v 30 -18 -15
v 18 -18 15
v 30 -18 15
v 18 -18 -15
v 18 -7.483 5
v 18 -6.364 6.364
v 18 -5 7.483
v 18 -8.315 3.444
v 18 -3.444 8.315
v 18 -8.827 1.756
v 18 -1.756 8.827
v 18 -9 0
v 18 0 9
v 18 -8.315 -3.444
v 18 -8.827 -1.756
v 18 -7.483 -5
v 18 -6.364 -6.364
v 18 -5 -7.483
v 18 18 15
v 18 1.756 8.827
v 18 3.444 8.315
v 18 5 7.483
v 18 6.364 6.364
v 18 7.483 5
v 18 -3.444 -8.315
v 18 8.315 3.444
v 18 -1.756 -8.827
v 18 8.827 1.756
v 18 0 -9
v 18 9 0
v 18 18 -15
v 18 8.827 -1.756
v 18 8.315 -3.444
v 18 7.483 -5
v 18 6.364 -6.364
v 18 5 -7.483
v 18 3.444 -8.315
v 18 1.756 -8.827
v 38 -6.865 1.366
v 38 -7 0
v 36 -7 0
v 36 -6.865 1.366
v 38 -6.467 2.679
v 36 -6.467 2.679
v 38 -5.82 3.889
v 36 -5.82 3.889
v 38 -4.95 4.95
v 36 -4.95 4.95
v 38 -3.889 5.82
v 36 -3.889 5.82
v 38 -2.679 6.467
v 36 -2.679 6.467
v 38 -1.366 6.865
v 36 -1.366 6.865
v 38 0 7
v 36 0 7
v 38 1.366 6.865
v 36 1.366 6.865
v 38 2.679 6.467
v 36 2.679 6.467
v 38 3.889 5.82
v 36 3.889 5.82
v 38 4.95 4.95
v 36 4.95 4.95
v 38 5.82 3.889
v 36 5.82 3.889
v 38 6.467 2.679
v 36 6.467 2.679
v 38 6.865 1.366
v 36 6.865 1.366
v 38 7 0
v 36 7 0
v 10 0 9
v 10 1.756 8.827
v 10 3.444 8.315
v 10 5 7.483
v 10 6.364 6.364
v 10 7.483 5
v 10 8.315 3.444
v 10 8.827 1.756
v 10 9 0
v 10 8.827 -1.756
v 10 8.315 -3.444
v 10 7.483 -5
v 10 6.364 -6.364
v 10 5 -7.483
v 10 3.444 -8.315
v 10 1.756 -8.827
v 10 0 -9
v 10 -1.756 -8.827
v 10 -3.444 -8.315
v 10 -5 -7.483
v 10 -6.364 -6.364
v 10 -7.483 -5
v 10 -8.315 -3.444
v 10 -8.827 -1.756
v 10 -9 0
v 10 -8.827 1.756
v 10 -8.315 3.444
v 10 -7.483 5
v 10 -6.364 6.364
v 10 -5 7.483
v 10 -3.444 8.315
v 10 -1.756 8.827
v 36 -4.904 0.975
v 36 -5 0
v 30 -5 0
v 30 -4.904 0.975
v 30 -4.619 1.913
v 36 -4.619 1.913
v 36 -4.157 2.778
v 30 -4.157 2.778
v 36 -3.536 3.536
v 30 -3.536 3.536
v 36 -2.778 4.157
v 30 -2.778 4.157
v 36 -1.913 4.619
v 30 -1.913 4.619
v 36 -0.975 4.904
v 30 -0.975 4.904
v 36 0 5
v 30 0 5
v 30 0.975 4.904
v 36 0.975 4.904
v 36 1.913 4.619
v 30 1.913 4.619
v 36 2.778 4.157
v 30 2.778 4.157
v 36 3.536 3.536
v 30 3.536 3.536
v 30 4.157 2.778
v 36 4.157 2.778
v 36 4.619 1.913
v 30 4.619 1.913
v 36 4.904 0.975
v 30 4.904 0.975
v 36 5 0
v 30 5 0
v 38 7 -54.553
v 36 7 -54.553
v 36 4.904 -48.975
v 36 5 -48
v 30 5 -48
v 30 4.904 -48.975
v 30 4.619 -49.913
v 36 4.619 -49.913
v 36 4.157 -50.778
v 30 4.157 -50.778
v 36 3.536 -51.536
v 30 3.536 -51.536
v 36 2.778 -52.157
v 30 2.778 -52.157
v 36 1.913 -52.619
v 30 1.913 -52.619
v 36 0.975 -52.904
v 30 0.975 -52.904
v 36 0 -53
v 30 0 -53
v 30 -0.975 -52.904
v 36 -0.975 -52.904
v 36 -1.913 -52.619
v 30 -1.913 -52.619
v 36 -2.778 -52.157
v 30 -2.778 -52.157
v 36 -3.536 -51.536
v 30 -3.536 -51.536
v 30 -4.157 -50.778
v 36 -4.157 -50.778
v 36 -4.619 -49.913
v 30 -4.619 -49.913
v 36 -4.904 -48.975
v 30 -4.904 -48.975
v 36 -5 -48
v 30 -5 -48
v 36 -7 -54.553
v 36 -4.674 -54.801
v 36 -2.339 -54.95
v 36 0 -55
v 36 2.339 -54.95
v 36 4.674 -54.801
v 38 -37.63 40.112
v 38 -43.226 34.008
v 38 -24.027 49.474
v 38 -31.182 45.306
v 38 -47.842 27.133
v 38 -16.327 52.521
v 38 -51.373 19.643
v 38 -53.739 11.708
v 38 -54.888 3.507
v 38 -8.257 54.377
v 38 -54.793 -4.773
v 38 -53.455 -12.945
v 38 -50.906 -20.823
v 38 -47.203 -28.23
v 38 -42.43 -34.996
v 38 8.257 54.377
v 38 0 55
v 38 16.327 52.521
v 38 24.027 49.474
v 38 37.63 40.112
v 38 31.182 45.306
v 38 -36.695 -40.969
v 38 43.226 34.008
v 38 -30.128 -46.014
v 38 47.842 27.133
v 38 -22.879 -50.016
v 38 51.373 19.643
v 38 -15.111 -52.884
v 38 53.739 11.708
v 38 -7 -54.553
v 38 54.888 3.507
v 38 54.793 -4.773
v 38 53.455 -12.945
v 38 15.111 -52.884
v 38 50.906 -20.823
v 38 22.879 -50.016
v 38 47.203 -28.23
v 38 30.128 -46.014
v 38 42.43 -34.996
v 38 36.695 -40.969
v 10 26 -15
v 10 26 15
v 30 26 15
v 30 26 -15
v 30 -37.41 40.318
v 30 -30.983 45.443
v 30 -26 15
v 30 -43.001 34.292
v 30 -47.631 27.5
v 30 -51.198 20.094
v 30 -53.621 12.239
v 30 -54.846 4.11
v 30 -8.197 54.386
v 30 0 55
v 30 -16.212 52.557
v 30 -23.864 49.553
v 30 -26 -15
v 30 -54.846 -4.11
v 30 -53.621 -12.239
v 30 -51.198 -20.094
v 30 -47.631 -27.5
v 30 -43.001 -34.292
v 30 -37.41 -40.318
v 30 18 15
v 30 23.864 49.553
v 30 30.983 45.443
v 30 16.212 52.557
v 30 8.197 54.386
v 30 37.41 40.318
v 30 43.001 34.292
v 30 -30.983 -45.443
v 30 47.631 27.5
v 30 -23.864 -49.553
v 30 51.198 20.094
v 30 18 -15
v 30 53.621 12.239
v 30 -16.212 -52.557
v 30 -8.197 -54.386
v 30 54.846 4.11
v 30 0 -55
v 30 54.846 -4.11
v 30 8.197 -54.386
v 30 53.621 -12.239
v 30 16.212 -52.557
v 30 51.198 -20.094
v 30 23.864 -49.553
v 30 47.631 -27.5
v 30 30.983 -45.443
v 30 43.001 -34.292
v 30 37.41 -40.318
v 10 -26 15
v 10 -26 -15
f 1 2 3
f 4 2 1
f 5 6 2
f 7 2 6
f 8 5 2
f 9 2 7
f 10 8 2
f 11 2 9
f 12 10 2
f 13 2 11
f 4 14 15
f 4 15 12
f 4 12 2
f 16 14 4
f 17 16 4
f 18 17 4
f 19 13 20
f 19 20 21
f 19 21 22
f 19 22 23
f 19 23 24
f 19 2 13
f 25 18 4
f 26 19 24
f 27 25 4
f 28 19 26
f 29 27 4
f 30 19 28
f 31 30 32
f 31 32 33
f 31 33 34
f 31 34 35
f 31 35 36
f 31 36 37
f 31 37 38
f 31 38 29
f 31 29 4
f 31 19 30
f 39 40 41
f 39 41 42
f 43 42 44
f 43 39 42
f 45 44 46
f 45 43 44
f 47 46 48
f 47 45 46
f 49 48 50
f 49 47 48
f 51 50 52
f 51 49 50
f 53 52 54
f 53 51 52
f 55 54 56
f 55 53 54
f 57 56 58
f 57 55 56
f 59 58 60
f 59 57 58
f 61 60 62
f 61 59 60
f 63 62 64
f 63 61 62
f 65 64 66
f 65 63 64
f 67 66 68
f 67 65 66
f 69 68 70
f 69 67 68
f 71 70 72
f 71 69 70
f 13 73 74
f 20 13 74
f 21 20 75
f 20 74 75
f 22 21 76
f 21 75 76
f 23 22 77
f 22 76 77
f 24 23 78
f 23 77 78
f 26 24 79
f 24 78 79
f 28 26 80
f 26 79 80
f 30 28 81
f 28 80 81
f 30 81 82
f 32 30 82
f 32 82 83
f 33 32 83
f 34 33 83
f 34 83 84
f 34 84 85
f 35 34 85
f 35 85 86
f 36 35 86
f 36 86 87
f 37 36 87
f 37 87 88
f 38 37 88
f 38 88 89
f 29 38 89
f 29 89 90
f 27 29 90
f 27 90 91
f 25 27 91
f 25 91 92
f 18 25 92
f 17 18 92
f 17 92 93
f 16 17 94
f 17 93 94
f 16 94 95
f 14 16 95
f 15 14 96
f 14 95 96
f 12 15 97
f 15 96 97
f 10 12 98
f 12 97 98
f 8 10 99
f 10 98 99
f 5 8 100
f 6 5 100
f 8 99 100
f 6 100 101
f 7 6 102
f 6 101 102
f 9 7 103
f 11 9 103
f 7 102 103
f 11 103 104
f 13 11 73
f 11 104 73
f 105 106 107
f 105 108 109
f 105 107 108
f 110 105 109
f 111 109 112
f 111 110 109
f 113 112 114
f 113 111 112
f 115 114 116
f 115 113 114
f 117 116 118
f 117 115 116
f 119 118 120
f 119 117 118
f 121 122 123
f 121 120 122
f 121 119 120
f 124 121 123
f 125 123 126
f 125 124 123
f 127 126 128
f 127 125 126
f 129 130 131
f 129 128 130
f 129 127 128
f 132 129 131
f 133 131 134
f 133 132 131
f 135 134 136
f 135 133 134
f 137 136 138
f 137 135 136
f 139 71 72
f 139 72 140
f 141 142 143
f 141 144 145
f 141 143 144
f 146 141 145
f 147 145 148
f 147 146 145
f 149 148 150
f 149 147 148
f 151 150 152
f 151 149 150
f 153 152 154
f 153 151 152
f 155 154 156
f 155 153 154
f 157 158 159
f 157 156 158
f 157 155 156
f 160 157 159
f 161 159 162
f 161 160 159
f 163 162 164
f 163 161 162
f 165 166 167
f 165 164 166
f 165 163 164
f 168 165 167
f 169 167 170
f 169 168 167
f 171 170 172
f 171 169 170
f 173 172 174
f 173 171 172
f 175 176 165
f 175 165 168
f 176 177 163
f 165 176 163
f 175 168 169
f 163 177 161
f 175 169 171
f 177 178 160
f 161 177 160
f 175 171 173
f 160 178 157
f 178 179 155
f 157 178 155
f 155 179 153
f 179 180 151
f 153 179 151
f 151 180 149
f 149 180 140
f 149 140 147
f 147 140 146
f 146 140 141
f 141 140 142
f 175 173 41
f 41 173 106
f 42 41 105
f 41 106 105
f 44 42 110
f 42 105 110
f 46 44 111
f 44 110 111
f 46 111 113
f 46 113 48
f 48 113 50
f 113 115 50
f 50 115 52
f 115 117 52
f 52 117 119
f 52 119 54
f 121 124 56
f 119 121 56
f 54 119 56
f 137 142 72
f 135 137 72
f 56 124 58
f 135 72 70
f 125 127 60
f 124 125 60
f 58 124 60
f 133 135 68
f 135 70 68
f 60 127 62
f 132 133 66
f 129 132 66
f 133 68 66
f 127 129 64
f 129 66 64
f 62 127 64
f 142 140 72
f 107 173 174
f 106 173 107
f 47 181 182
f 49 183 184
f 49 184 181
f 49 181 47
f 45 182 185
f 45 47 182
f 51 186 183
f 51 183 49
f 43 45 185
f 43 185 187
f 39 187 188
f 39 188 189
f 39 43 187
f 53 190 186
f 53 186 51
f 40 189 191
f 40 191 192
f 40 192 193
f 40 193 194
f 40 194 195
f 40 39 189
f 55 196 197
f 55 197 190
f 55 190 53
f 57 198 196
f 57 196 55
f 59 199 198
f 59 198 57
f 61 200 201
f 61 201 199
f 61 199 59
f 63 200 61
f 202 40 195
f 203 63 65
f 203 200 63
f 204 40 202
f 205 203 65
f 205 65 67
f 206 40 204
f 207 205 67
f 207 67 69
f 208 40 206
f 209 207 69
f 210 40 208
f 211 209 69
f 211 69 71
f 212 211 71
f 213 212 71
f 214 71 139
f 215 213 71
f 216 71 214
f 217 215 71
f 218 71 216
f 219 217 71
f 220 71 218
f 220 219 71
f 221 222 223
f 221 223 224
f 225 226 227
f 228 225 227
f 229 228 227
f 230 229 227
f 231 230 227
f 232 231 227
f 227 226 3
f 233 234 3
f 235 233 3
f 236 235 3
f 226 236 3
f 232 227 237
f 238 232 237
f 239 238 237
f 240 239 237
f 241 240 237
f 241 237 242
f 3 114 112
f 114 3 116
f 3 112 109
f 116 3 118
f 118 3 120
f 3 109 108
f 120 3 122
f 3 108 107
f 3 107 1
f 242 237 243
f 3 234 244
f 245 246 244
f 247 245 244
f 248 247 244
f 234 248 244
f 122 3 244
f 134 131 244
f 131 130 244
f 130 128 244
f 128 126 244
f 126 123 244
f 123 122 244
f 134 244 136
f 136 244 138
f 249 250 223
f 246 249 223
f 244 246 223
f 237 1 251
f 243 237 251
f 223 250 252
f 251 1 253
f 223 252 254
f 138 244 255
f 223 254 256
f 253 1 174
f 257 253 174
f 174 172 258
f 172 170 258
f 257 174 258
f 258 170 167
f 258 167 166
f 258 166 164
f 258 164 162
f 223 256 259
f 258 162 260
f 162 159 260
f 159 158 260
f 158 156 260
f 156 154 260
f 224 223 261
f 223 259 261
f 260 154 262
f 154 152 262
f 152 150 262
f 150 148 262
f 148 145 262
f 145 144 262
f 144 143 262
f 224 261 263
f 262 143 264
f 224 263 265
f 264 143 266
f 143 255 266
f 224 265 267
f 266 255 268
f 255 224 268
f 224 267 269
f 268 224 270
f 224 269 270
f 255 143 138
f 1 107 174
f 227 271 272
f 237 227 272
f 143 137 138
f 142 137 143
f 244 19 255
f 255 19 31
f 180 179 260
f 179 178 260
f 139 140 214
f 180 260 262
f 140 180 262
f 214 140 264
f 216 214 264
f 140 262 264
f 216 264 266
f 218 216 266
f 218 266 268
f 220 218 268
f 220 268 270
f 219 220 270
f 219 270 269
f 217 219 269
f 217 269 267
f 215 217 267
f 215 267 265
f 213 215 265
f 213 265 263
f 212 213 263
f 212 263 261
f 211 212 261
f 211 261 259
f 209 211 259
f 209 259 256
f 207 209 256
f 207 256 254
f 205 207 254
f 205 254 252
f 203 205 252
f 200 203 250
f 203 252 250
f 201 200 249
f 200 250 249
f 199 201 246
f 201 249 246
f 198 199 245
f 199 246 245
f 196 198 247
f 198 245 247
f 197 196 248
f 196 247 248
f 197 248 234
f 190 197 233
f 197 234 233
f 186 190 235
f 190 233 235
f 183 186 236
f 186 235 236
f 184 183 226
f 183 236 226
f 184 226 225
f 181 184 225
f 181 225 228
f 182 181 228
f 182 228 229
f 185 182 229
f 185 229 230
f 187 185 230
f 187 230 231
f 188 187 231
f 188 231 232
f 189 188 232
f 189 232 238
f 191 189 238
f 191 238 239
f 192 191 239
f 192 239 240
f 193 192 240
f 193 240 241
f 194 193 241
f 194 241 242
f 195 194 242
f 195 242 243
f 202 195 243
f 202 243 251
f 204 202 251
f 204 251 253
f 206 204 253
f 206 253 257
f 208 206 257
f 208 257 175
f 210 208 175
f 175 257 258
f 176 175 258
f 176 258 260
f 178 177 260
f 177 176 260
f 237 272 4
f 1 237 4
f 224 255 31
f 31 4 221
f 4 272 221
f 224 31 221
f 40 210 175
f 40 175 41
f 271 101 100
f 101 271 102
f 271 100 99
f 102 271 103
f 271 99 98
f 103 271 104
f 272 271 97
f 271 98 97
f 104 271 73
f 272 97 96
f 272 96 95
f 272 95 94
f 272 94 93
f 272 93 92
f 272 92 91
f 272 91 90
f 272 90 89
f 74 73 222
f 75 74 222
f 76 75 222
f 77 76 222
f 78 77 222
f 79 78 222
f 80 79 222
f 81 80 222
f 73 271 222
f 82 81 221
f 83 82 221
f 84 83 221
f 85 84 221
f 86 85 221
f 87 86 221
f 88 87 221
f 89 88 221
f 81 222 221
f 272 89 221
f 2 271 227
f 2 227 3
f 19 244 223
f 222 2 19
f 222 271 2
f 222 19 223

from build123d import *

# Parameters (mm, degrees)
SKETCH_1_R          = 7.5
EXTRUDE_1_DEPTH     = 10
SKETCH_5_W          = 30
SKETCH_5_H          = 52
EXTRUDE_2_DEPTH     = 8
SKETCH_6_W          = 30
SKETCH_6_H          = 8
EXTRUDE_3_DEPTH     = 12
SKETCH_7_R          = 55
EXTRUDE_4_DEPTH     = 8
CUT_EXTRUDE_4_REACH = 40
CUT_EXTRUDE_6_DEPTH = 2
CUT_EXTRUDE_7_REACH = 40
SKETCH_12_R         = 9


with BuildPart() as part:
    # 草图1 → 凸台-拉伸1 (new body)
    with BuildSketch(Plane(origin=(0, 0, 0), x_dir=(0, 0, -1), z_dir=(1, 0, 0))):
        Circle(SKETCH_1_R)
    extrude(amount=EXTRUDE_1_DEPTH)

    # 草图5 → 凸台-拉伸2 (add)
    with BuildSketch(Plane(origin=(10, 0, 0), x_dir=(0, 0, -1), z_dir=(1, 0, 0))):
        Rectangle(SKETCH_5_W, SKETCH_5_H)
    extrude(amount=EXTRUDE_2_DEPTH)

    # 草图6 → 凸台-拉伸3 (add)
    with BuildSketch(Plane(origin=(18, 0, 0), x_dir=(0, 0, -1), z_dir=(1, 0, 0))):
        with Locations((0, 22)):
            Rectangle(SKETCH_6_W, SKETCH_6_H)
        with Locations((0, -22)):
            Rectangle(SKETCH_6_W, SKETCH_6_H)
    extrude(amount=EXTRUDE_3_DEPTH)

    # 草图7 → 凸台-拉伸4 (add)
    with BuildSketch(Plane(origin=(30, 0, 0), x_dir=(0, 0, -1), z_dir=(1, 0, 0))):
        Circle(SKETCH_7_R)
    extrude(amount=EXTRUDE_4_DEPTH)

    # 草图8 → 切除-拉伸4 (cut, up to next)
    with BuildSketch(Plane(origin=(38, 0, 0), x_dir=(0, 0, -1), z_dir=(1, 0, 0)), mode=Mode.PRIVATE) as cut_extrude_4_sk1:
        with BuildLine():
            Line((0, 5), (48, 5))
            ThreePointArc((48, 5), (53, 0), (48, -5))
            Line((48, -5), (0, -5))
            ThreePointArc((0, -5), (-5, 0), (0, 5))
        make_face()
    cut_extrude_4_tool1 = extrude(cut_extrude_4_sk1.sketch, amount=-CUT_EXTRUDE_4_REACH, mode=Mode.PRIVATE) & part.part
    add(cut_extrude_4_tool1.solids().sort_by_distance((38, 0, -24))[0], mode=Mode.SUBTRACT)

    # 草图11 → 切除-拉伸6 (cut)
    with BuildSketch(Plane(origin=(38, 0, 0), x_dir=(0, 0, -1), z_dir=(1, 0, 0))):
        with BuildLine():
            Line((0, 7), (54.552726788, 7))
            ThreePointArc((54.552726788, 7), (55, 0), (54.552726788, -7))
            Line((54.552726788, -7), (0, -7))
            ThreePointArc((0, -7), (-7, 0), (0, 7))
        make_face()
    extrude(amount=-CUT_EXTRUDE_6_DEPTH, mode=Mode.SUBTRACT)

    # 草图12 → 切除-拉伸7 (cut, up to next)
    with BuildSketch(Plane.ZY, mode=Mode.PRIVATE) as cut_extrude_7_sk1:
        Circle(SKETCH_12_R)
    cut_extrude_7_tool1 = extrude(cut_extrude_7_sk1.sketch, amount=-CUT_EXTRUDE_7_REACH, mode=Mode.PRIVATE) & part.part
    add(cut_extrude_7_tool1.solids().sort_by_distance((0, 0, 0))[0], mode=Mode.SUBTRACT)


solid = part.part
